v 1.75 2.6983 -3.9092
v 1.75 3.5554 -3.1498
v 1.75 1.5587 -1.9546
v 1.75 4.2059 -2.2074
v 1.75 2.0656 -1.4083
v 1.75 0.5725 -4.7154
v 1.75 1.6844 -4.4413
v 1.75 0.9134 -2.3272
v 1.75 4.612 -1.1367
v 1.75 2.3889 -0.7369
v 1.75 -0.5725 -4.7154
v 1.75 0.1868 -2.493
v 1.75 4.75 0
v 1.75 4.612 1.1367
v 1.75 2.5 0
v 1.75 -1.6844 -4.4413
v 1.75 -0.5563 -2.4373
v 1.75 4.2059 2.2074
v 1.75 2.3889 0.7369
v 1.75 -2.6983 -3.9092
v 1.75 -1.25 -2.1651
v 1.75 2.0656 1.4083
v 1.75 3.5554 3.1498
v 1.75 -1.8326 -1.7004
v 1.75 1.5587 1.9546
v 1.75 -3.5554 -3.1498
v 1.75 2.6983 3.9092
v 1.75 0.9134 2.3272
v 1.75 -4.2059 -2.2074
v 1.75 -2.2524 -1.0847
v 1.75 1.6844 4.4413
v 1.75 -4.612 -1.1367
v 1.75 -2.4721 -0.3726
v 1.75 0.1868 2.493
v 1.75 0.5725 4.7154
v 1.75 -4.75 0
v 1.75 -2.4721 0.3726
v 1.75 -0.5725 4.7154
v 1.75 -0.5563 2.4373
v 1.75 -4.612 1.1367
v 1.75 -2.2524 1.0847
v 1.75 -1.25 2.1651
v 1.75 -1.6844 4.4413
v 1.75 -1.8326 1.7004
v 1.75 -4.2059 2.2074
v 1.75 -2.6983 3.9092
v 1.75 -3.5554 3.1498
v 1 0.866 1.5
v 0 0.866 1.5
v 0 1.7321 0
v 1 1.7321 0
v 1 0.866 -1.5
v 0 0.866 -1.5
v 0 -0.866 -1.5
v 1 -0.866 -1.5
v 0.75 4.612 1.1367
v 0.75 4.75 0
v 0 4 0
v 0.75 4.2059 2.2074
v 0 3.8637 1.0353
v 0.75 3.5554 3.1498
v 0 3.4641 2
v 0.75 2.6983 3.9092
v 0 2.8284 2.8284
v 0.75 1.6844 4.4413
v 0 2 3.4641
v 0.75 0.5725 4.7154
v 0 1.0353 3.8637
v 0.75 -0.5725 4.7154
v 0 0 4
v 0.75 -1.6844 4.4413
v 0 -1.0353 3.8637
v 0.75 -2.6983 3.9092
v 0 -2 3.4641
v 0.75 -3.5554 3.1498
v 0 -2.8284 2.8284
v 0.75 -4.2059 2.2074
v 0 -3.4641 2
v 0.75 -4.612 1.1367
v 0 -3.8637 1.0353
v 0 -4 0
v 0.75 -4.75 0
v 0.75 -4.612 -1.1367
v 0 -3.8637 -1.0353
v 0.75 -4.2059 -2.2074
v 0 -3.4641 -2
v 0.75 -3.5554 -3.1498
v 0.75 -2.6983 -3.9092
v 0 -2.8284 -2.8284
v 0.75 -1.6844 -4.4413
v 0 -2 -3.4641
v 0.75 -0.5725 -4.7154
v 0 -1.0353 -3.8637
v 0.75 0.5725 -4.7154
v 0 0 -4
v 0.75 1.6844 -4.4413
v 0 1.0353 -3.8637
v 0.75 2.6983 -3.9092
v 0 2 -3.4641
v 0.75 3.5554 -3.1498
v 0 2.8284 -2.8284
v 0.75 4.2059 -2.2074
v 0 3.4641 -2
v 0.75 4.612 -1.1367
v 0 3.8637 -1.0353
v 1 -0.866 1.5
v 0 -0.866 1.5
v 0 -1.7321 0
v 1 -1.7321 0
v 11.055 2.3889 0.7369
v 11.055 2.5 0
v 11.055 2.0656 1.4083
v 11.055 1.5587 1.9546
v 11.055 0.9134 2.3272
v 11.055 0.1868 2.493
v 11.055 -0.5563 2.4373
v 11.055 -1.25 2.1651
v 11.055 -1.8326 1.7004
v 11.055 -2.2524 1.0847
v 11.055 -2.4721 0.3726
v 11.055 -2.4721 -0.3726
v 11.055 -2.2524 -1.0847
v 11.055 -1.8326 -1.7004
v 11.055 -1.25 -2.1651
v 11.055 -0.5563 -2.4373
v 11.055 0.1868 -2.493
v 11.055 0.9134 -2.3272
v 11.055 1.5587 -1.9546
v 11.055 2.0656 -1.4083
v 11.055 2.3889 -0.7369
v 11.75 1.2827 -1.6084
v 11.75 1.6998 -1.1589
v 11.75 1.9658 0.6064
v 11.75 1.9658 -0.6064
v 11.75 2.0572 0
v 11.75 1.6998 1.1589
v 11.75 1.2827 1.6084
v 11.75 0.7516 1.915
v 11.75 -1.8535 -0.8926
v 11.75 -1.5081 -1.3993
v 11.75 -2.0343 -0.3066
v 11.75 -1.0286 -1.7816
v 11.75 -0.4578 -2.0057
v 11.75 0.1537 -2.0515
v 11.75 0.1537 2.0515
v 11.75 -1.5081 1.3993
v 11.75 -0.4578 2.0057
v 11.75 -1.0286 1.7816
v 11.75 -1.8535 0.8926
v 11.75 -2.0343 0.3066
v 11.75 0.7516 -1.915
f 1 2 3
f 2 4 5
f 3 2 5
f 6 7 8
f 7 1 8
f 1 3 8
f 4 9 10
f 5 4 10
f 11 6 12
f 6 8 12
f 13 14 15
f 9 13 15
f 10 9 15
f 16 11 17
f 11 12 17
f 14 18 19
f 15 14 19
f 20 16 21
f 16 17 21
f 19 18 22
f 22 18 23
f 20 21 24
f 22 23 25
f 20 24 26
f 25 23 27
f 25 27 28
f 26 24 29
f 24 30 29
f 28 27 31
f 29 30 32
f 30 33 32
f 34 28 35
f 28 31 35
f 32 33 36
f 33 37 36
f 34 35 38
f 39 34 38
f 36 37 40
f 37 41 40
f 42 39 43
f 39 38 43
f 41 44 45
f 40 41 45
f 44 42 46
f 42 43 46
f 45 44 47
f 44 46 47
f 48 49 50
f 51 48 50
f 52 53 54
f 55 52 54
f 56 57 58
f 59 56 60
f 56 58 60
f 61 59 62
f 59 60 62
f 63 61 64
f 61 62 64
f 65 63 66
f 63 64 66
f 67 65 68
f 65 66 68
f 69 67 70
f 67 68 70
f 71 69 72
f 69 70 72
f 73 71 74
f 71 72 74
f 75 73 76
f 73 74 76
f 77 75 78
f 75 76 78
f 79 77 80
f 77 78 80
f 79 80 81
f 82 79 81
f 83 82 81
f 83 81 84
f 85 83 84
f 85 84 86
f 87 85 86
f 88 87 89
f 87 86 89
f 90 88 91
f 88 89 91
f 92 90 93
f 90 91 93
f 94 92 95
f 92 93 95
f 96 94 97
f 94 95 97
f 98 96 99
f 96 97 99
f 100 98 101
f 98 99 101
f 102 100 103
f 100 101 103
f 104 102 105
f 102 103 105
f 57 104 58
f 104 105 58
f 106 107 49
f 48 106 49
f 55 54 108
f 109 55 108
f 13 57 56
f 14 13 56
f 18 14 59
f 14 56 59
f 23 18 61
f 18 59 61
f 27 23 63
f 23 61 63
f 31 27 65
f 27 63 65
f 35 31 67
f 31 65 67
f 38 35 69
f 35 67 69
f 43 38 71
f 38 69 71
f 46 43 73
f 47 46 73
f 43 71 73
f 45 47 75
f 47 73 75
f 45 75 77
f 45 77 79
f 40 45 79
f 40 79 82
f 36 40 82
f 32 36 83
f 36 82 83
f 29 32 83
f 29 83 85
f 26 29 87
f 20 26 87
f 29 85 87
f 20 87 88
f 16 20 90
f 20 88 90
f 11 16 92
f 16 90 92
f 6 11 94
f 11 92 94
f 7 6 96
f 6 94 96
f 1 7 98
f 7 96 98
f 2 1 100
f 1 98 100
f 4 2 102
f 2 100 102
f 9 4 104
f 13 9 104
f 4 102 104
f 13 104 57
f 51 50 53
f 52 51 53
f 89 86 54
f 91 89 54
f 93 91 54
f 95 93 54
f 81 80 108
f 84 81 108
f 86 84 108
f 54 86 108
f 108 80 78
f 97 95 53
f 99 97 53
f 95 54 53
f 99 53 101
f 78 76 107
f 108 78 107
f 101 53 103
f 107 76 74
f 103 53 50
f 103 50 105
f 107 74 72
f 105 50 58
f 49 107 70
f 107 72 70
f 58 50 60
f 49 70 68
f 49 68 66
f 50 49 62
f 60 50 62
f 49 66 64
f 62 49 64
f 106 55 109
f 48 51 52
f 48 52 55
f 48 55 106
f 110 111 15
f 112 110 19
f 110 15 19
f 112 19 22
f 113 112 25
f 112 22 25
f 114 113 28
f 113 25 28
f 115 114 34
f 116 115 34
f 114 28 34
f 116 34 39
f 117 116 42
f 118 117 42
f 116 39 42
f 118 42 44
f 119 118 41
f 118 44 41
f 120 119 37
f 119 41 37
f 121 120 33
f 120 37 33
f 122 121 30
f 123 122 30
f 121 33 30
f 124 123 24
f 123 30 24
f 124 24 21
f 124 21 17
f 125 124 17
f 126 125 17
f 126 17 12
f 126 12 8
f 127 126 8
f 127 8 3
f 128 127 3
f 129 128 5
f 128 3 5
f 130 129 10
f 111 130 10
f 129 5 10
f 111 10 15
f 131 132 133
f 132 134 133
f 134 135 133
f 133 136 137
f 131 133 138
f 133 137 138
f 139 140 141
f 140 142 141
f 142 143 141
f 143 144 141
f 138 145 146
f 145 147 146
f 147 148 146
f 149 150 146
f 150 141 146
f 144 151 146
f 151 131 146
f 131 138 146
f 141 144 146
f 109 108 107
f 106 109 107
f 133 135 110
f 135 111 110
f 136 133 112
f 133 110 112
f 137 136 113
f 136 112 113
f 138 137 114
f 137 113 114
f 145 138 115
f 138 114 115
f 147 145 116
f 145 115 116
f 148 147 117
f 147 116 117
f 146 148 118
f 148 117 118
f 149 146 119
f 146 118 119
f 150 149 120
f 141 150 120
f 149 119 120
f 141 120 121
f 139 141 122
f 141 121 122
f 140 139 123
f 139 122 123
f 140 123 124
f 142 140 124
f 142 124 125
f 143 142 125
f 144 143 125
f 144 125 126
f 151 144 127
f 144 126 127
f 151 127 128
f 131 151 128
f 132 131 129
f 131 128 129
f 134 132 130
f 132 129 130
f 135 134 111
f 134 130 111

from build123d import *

# Parameters (mm, degrees)
CUT_EXTRUDE1_DEPTH = 1
CHAMFER1_SIZE      = 0.75


with BuildPart() as part:
    # Sketch1 → Revolve1 (revolve)
    with BuildSketch(Plane.XY):
        Polygon((11.75, 0), (11.75, 2.057236169), (11.055, 2.5), (1.75, 2.5), (1.75, 4.75), (0, 4.75), (0, 0), align=None)
    revolve(axis=Axis((0, 0, 0), (1, 0, 0)))

    # Sketch5 → Cut-Extrude1 (cut)
    with BuildSketch(Plane.ZY):
        Polygon((1.5, -0.866025404), (1.5, 0.866025404), (0, 1.732050808), (-1.5, 0.866025404), (-1.5, -0.866025404), (0, -1.732050808), align=None)
    extrude(amount=-CUT_EXTRUDE1_DEPTH, mode=Mode.SUBTRACT)

    # Chamfer1
    chamfer1_edges = [part.edges().sort_by_distance(p)[0] for p in [
        (0, -4.75, 0),
    ]]
    chamfer(chamfer1_edges, length=CHAMFER1_SIZE)


solid = part.part
